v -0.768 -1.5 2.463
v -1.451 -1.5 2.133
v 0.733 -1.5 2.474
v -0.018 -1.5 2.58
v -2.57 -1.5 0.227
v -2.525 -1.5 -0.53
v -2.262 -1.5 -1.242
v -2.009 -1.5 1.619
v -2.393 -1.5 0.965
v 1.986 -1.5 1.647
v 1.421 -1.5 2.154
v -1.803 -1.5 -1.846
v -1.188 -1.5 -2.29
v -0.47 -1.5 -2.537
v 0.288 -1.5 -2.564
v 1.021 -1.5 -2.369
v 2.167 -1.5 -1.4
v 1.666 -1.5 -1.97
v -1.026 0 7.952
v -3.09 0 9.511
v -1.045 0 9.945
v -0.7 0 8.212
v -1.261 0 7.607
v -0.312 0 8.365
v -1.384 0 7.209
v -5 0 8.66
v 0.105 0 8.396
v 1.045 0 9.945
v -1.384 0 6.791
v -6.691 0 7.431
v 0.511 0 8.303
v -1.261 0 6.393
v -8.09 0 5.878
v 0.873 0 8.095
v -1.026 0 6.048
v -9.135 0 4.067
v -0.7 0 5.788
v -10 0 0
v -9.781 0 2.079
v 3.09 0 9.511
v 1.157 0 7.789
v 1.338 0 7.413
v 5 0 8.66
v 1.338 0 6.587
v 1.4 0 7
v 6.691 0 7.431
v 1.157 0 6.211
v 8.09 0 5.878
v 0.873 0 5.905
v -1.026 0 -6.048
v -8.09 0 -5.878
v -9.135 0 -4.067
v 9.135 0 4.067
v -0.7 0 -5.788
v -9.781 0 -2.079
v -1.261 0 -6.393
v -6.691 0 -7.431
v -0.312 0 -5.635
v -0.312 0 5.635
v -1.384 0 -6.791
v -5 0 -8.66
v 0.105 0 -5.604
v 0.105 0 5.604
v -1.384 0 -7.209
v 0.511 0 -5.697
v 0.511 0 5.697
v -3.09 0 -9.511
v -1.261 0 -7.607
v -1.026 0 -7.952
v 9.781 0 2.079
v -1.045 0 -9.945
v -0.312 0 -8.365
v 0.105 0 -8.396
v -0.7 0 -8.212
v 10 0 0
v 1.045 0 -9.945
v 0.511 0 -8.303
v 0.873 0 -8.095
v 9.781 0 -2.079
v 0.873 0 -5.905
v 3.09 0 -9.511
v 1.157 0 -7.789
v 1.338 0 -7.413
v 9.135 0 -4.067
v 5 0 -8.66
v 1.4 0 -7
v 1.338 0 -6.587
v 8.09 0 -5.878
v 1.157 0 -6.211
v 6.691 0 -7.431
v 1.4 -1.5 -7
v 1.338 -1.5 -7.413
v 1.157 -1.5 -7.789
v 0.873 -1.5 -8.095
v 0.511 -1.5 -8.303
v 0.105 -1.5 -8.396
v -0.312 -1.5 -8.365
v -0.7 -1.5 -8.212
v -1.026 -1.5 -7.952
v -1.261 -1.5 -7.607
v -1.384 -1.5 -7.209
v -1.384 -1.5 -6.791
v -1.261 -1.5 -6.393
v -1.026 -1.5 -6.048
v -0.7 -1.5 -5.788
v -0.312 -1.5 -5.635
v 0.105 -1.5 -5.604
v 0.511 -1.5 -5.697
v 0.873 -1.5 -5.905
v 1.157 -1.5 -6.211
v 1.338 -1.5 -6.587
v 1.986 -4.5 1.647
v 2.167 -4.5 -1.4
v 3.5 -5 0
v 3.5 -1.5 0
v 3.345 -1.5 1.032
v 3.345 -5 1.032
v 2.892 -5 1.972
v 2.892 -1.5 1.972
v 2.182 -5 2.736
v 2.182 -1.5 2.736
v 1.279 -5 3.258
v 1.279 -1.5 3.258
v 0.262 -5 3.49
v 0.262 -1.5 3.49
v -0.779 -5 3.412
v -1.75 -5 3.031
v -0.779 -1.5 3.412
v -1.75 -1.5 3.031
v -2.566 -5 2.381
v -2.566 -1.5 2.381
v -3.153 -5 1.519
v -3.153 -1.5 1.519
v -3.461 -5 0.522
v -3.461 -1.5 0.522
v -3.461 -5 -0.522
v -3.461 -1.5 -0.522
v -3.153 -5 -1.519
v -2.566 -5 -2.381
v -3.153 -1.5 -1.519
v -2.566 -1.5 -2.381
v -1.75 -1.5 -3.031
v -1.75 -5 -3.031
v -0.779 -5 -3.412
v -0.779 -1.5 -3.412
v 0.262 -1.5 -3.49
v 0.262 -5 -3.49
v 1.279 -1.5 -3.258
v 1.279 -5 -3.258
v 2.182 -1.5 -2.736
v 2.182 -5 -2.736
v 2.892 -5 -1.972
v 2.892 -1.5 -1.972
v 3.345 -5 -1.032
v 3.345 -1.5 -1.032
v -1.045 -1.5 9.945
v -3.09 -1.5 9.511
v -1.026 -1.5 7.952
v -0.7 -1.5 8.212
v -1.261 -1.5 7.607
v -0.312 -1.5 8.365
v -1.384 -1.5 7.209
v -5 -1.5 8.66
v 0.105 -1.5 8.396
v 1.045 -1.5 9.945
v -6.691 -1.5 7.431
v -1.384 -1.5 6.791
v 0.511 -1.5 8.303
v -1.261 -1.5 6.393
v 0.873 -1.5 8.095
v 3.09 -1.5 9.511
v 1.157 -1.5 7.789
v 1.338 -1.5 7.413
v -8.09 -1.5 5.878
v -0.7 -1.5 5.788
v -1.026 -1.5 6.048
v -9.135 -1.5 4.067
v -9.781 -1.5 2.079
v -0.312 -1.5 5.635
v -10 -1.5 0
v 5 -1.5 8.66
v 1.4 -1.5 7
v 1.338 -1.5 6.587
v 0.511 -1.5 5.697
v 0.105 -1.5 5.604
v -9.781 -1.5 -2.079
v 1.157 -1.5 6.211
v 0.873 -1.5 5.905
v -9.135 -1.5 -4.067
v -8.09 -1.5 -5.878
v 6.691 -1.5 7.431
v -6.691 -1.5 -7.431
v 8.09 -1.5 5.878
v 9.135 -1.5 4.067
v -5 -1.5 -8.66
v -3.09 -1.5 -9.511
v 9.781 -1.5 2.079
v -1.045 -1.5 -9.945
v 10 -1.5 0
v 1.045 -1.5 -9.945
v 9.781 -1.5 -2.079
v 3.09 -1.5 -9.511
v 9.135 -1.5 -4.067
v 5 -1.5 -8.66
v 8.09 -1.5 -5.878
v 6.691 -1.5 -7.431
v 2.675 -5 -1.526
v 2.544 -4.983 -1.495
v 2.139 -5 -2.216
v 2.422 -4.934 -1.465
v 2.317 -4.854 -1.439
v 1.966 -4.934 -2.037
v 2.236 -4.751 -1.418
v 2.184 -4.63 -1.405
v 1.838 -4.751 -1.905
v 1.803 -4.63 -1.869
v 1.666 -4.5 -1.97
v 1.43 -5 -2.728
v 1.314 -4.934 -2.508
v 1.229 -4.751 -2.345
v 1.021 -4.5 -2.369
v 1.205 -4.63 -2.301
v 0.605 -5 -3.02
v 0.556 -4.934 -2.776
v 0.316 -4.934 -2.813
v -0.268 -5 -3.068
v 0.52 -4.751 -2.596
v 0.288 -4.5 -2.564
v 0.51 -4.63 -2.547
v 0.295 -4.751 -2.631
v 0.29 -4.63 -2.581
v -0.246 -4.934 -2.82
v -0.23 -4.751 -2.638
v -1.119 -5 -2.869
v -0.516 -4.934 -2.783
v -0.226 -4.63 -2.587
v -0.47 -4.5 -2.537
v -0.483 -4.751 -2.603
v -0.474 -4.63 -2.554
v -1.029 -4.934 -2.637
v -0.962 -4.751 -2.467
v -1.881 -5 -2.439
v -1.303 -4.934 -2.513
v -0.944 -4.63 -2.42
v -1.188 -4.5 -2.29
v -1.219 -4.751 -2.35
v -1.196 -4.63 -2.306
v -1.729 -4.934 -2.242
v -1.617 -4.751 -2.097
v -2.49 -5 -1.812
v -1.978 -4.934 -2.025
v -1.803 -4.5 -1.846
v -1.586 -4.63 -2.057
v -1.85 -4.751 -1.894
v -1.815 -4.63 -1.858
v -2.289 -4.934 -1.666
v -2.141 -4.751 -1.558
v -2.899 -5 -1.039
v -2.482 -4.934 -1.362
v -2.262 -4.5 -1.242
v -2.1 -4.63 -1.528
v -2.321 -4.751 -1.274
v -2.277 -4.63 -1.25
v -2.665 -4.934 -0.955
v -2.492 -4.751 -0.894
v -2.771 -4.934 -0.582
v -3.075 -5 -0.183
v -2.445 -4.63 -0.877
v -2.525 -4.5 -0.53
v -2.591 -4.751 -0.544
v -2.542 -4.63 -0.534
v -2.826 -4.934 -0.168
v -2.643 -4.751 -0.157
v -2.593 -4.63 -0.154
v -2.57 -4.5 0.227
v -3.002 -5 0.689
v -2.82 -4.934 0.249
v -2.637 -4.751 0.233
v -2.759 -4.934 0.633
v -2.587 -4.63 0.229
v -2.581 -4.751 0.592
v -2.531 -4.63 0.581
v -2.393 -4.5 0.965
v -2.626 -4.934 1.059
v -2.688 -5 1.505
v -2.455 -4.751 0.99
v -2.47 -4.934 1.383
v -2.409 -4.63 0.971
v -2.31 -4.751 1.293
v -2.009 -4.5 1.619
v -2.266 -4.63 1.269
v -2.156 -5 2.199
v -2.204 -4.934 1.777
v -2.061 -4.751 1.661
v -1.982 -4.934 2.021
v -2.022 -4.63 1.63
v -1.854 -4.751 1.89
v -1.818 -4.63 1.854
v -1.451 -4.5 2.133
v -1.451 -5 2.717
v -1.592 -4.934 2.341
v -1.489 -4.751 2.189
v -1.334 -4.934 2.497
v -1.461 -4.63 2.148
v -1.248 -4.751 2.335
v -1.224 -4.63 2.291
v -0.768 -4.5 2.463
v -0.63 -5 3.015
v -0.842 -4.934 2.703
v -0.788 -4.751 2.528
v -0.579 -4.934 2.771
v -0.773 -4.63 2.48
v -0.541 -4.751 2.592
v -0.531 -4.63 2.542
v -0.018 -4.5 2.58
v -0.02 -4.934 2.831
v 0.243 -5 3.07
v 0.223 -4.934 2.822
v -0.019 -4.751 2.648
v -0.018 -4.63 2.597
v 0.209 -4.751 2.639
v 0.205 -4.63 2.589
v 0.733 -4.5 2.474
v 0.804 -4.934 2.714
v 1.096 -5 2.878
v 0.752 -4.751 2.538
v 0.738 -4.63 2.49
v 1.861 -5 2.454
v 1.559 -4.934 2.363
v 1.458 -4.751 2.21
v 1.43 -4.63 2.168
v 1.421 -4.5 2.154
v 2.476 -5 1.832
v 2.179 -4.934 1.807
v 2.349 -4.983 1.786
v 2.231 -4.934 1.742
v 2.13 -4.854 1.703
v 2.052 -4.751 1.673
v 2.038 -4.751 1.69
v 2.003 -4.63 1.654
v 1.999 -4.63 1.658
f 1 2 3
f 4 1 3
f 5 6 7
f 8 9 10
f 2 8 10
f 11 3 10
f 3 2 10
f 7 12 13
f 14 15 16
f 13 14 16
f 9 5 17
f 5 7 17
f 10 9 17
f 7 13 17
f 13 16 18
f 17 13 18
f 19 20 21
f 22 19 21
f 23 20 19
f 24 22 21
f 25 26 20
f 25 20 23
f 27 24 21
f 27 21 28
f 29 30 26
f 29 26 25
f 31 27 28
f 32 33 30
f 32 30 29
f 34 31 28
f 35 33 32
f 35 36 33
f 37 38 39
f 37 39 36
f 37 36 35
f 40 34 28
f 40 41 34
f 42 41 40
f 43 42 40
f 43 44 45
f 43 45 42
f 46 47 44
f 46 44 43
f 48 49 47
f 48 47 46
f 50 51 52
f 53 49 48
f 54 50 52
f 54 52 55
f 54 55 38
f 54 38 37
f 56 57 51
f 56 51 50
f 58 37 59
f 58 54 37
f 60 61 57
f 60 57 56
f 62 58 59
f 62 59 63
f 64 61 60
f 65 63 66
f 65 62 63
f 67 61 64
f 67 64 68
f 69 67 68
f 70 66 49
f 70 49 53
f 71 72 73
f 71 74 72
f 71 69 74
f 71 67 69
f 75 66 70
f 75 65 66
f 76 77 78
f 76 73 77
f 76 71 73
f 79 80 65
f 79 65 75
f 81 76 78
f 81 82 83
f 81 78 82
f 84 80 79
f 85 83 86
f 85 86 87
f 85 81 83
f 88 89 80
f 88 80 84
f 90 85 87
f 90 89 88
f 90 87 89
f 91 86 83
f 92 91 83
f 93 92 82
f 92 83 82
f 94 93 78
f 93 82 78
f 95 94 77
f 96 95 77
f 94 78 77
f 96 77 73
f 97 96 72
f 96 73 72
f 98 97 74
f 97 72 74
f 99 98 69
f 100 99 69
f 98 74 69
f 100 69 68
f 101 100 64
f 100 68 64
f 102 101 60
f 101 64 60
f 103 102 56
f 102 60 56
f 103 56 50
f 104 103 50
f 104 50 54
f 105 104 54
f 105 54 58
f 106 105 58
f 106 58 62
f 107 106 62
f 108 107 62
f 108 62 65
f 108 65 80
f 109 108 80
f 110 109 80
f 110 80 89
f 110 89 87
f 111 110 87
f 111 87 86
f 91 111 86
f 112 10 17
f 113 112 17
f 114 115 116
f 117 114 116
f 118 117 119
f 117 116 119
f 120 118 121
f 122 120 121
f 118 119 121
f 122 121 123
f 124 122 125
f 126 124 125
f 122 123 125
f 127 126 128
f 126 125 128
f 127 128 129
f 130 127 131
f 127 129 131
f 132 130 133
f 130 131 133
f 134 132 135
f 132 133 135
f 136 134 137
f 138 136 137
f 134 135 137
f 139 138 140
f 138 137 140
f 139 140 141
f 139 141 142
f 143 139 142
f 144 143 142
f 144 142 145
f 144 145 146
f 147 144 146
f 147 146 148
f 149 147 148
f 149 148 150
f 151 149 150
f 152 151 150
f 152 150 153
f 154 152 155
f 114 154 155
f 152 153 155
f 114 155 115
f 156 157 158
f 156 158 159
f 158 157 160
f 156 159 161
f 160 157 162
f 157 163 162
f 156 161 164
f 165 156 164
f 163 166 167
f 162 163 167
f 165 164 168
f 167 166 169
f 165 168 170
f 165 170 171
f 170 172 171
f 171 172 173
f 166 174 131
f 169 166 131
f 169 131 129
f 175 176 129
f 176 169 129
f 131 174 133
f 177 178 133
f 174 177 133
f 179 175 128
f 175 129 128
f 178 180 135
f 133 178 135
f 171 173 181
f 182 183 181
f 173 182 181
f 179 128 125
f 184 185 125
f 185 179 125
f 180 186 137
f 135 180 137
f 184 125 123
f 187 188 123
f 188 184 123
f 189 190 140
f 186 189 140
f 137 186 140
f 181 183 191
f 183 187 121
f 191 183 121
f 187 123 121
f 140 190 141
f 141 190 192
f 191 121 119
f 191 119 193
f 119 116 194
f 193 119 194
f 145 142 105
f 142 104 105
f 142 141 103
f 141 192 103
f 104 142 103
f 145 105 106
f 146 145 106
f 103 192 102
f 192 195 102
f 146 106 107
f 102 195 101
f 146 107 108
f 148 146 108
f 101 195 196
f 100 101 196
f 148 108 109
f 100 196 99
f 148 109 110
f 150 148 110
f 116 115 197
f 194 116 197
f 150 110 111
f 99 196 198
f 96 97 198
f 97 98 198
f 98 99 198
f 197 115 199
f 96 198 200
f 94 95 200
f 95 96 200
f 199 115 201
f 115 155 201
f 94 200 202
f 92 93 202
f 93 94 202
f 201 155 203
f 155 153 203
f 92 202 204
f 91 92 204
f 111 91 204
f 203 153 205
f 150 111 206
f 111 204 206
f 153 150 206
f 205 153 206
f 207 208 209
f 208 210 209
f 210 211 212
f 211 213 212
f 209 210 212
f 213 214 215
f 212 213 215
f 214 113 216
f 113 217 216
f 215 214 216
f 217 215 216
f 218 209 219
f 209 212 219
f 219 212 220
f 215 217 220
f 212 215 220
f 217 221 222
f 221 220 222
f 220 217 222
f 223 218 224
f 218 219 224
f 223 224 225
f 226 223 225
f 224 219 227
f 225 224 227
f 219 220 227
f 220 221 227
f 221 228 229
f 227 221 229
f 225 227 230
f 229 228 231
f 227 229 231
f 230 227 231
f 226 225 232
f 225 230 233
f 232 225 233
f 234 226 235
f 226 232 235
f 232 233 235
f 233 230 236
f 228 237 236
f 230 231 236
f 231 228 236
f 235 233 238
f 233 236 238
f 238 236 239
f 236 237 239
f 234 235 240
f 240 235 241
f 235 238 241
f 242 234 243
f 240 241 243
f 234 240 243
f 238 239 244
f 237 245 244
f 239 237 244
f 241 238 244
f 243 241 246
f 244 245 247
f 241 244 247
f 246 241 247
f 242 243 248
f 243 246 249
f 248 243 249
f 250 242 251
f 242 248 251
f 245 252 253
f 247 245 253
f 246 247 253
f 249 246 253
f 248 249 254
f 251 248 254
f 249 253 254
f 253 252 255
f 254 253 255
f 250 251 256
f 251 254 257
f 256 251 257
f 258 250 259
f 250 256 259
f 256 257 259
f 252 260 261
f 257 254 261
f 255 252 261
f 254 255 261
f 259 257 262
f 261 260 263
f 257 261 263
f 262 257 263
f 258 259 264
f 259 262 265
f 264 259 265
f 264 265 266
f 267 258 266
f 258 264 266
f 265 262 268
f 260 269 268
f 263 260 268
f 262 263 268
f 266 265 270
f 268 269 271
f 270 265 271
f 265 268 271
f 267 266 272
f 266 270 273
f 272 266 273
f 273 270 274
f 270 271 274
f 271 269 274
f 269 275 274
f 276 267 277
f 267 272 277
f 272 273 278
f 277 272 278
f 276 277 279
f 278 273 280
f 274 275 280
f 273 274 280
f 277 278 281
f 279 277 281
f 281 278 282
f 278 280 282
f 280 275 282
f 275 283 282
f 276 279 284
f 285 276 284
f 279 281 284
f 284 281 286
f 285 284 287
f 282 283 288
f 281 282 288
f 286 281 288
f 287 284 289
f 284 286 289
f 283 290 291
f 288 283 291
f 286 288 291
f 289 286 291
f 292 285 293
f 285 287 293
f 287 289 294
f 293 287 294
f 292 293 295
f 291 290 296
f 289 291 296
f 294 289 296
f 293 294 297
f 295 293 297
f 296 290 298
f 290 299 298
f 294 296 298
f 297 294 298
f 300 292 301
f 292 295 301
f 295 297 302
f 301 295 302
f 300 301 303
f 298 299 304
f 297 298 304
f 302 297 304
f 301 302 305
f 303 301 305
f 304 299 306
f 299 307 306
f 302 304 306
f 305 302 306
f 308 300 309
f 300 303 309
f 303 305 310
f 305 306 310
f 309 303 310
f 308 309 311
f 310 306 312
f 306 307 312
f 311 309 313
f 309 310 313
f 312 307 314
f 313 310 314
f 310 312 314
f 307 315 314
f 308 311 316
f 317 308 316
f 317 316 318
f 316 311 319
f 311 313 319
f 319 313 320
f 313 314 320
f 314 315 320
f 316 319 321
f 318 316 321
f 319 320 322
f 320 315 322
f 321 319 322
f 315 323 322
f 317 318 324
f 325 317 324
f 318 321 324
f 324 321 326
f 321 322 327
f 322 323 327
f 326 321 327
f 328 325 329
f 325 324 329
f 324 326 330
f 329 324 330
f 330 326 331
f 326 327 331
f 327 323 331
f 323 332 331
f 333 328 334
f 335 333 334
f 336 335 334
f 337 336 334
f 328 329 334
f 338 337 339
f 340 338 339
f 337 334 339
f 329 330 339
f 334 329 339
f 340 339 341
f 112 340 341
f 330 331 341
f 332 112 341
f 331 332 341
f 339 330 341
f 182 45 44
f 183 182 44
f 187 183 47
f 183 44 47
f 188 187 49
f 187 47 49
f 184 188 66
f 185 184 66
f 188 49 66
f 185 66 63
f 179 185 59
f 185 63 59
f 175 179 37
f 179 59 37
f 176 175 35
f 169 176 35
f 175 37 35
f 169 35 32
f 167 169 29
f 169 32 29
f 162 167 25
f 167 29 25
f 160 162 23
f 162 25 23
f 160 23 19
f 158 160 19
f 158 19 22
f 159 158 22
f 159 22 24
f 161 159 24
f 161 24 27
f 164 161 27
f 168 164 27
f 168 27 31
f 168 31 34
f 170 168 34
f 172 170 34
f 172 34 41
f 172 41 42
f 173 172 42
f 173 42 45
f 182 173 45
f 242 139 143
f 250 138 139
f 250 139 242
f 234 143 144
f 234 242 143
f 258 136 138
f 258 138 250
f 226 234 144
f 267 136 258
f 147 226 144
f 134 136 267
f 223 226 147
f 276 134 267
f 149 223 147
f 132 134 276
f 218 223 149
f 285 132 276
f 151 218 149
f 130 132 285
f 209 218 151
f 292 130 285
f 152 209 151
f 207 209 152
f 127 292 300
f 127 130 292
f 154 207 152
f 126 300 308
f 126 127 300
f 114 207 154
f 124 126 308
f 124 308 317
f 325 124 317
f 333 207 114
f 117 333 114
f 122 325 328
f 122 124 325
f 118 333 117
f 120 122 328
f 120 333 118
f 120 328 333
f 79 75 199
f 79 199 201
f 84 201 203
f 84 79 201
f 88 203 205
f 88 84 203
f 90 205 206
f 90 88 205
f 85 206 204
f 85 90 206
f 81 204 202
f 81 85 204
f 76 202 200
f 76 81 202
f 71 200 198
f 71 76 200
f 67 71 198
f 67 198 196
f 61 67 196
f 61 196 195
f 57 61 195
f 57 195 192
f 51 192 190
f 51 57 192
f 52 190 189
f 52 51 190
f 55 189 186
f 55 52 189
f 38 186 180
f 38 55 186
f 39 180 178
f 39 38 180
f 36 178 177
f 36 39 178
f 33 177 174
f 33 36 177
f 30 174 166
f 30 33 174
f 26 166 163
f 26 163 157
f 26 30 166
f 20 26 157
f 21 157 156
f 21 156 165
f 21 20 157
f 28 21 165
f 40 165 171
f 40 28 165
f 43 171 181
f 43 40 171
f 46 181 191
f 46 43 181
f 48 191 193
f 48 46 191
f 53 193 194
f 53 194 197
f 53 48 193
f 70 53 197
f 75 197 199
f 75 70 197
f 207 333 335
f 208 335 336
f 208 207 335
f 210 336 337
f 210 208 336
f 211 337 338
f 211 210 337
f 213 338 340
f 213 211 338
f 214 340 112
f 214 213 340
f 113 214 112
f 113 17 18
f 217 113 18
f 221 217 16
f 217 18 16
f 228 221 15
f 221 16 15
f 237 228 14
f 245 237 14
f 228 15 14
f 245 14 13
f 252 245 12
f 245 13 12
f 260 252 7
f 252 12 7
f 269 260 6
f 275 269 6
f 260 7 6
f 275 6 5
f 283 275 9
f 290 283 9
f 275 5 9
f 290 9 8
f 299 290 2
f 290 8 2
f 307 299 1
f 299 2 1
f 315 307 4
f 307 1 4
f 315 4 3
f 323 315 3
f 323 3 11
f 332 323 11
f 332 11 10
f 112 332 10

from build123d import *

# Parameters (mm, degrees)
SKETCH1_R           = 10
BOSS_EXTRUDE1_DEPTH = 1.5
SKETCH2_R           = 1.4
CUT_EXTRUDE1_DEPTH  = 2.5
SKETCH3_R           = 3.5
BOSS_EXTRUDE2_DEPTH = 3.5
FILLET1_R           = 0.5


with BuildPart() as part:
    # Sketch1 → Boss-Extrude1 (new body)
    with BuildSketch(Plane(origin=(0, 0, 0), x_dir=(1, 0, 0), z_dir=(0, 1, 0))):
        Circle(SKETCH1_R)
    extrude(amount=-BOSS_EXTRUDE1_DEPTH)

    # Sketch2 → Cut-Extrude1 (cut, through all)
    with BuildSketch(Plane(origin=(0, 0, 0), x_dir=(1, 0, 0), z_dir=(0, 1, 0))):
        with Locations((0, 7)):
            Circle(SKETCH2_R)
        with Locations((0, -7)):
            Circle(SKETCH2_R)
    extrude(amount=-CUT_EXTRUDE1_DEPTH, mode=Mode.SUBTRACT)

    # Sketch3 → Boss-Extrude2 (add)
    with BuildSketch(Plane.XZ.offset(1.5)):
        Circle(SKETCH3_R)
        with BuildLine():
            Line((1.985734783, 1.647196822), (2.166931392, -1.400288664))
            ThreePointArc((2.166931392, -1.400288664), (-2.575451618, -0.15313054), (1.985734783, 1.647196822))
        make_face(mode=Mode.SUBTRACT)
    extrude(amount=BOSS_EXTRUDE2_DEPTH)

    # Fillet1
    fillet1_edges = [part.edges().sort_by_distance(p)[0] for p in [
        (-2.575451618, -5, -0.15313054),
        (2.076333088, -5, 0.123454079),
    ]]
    fillet(fillet1_edges, radius=FILLET1_R)


solid = part.part
